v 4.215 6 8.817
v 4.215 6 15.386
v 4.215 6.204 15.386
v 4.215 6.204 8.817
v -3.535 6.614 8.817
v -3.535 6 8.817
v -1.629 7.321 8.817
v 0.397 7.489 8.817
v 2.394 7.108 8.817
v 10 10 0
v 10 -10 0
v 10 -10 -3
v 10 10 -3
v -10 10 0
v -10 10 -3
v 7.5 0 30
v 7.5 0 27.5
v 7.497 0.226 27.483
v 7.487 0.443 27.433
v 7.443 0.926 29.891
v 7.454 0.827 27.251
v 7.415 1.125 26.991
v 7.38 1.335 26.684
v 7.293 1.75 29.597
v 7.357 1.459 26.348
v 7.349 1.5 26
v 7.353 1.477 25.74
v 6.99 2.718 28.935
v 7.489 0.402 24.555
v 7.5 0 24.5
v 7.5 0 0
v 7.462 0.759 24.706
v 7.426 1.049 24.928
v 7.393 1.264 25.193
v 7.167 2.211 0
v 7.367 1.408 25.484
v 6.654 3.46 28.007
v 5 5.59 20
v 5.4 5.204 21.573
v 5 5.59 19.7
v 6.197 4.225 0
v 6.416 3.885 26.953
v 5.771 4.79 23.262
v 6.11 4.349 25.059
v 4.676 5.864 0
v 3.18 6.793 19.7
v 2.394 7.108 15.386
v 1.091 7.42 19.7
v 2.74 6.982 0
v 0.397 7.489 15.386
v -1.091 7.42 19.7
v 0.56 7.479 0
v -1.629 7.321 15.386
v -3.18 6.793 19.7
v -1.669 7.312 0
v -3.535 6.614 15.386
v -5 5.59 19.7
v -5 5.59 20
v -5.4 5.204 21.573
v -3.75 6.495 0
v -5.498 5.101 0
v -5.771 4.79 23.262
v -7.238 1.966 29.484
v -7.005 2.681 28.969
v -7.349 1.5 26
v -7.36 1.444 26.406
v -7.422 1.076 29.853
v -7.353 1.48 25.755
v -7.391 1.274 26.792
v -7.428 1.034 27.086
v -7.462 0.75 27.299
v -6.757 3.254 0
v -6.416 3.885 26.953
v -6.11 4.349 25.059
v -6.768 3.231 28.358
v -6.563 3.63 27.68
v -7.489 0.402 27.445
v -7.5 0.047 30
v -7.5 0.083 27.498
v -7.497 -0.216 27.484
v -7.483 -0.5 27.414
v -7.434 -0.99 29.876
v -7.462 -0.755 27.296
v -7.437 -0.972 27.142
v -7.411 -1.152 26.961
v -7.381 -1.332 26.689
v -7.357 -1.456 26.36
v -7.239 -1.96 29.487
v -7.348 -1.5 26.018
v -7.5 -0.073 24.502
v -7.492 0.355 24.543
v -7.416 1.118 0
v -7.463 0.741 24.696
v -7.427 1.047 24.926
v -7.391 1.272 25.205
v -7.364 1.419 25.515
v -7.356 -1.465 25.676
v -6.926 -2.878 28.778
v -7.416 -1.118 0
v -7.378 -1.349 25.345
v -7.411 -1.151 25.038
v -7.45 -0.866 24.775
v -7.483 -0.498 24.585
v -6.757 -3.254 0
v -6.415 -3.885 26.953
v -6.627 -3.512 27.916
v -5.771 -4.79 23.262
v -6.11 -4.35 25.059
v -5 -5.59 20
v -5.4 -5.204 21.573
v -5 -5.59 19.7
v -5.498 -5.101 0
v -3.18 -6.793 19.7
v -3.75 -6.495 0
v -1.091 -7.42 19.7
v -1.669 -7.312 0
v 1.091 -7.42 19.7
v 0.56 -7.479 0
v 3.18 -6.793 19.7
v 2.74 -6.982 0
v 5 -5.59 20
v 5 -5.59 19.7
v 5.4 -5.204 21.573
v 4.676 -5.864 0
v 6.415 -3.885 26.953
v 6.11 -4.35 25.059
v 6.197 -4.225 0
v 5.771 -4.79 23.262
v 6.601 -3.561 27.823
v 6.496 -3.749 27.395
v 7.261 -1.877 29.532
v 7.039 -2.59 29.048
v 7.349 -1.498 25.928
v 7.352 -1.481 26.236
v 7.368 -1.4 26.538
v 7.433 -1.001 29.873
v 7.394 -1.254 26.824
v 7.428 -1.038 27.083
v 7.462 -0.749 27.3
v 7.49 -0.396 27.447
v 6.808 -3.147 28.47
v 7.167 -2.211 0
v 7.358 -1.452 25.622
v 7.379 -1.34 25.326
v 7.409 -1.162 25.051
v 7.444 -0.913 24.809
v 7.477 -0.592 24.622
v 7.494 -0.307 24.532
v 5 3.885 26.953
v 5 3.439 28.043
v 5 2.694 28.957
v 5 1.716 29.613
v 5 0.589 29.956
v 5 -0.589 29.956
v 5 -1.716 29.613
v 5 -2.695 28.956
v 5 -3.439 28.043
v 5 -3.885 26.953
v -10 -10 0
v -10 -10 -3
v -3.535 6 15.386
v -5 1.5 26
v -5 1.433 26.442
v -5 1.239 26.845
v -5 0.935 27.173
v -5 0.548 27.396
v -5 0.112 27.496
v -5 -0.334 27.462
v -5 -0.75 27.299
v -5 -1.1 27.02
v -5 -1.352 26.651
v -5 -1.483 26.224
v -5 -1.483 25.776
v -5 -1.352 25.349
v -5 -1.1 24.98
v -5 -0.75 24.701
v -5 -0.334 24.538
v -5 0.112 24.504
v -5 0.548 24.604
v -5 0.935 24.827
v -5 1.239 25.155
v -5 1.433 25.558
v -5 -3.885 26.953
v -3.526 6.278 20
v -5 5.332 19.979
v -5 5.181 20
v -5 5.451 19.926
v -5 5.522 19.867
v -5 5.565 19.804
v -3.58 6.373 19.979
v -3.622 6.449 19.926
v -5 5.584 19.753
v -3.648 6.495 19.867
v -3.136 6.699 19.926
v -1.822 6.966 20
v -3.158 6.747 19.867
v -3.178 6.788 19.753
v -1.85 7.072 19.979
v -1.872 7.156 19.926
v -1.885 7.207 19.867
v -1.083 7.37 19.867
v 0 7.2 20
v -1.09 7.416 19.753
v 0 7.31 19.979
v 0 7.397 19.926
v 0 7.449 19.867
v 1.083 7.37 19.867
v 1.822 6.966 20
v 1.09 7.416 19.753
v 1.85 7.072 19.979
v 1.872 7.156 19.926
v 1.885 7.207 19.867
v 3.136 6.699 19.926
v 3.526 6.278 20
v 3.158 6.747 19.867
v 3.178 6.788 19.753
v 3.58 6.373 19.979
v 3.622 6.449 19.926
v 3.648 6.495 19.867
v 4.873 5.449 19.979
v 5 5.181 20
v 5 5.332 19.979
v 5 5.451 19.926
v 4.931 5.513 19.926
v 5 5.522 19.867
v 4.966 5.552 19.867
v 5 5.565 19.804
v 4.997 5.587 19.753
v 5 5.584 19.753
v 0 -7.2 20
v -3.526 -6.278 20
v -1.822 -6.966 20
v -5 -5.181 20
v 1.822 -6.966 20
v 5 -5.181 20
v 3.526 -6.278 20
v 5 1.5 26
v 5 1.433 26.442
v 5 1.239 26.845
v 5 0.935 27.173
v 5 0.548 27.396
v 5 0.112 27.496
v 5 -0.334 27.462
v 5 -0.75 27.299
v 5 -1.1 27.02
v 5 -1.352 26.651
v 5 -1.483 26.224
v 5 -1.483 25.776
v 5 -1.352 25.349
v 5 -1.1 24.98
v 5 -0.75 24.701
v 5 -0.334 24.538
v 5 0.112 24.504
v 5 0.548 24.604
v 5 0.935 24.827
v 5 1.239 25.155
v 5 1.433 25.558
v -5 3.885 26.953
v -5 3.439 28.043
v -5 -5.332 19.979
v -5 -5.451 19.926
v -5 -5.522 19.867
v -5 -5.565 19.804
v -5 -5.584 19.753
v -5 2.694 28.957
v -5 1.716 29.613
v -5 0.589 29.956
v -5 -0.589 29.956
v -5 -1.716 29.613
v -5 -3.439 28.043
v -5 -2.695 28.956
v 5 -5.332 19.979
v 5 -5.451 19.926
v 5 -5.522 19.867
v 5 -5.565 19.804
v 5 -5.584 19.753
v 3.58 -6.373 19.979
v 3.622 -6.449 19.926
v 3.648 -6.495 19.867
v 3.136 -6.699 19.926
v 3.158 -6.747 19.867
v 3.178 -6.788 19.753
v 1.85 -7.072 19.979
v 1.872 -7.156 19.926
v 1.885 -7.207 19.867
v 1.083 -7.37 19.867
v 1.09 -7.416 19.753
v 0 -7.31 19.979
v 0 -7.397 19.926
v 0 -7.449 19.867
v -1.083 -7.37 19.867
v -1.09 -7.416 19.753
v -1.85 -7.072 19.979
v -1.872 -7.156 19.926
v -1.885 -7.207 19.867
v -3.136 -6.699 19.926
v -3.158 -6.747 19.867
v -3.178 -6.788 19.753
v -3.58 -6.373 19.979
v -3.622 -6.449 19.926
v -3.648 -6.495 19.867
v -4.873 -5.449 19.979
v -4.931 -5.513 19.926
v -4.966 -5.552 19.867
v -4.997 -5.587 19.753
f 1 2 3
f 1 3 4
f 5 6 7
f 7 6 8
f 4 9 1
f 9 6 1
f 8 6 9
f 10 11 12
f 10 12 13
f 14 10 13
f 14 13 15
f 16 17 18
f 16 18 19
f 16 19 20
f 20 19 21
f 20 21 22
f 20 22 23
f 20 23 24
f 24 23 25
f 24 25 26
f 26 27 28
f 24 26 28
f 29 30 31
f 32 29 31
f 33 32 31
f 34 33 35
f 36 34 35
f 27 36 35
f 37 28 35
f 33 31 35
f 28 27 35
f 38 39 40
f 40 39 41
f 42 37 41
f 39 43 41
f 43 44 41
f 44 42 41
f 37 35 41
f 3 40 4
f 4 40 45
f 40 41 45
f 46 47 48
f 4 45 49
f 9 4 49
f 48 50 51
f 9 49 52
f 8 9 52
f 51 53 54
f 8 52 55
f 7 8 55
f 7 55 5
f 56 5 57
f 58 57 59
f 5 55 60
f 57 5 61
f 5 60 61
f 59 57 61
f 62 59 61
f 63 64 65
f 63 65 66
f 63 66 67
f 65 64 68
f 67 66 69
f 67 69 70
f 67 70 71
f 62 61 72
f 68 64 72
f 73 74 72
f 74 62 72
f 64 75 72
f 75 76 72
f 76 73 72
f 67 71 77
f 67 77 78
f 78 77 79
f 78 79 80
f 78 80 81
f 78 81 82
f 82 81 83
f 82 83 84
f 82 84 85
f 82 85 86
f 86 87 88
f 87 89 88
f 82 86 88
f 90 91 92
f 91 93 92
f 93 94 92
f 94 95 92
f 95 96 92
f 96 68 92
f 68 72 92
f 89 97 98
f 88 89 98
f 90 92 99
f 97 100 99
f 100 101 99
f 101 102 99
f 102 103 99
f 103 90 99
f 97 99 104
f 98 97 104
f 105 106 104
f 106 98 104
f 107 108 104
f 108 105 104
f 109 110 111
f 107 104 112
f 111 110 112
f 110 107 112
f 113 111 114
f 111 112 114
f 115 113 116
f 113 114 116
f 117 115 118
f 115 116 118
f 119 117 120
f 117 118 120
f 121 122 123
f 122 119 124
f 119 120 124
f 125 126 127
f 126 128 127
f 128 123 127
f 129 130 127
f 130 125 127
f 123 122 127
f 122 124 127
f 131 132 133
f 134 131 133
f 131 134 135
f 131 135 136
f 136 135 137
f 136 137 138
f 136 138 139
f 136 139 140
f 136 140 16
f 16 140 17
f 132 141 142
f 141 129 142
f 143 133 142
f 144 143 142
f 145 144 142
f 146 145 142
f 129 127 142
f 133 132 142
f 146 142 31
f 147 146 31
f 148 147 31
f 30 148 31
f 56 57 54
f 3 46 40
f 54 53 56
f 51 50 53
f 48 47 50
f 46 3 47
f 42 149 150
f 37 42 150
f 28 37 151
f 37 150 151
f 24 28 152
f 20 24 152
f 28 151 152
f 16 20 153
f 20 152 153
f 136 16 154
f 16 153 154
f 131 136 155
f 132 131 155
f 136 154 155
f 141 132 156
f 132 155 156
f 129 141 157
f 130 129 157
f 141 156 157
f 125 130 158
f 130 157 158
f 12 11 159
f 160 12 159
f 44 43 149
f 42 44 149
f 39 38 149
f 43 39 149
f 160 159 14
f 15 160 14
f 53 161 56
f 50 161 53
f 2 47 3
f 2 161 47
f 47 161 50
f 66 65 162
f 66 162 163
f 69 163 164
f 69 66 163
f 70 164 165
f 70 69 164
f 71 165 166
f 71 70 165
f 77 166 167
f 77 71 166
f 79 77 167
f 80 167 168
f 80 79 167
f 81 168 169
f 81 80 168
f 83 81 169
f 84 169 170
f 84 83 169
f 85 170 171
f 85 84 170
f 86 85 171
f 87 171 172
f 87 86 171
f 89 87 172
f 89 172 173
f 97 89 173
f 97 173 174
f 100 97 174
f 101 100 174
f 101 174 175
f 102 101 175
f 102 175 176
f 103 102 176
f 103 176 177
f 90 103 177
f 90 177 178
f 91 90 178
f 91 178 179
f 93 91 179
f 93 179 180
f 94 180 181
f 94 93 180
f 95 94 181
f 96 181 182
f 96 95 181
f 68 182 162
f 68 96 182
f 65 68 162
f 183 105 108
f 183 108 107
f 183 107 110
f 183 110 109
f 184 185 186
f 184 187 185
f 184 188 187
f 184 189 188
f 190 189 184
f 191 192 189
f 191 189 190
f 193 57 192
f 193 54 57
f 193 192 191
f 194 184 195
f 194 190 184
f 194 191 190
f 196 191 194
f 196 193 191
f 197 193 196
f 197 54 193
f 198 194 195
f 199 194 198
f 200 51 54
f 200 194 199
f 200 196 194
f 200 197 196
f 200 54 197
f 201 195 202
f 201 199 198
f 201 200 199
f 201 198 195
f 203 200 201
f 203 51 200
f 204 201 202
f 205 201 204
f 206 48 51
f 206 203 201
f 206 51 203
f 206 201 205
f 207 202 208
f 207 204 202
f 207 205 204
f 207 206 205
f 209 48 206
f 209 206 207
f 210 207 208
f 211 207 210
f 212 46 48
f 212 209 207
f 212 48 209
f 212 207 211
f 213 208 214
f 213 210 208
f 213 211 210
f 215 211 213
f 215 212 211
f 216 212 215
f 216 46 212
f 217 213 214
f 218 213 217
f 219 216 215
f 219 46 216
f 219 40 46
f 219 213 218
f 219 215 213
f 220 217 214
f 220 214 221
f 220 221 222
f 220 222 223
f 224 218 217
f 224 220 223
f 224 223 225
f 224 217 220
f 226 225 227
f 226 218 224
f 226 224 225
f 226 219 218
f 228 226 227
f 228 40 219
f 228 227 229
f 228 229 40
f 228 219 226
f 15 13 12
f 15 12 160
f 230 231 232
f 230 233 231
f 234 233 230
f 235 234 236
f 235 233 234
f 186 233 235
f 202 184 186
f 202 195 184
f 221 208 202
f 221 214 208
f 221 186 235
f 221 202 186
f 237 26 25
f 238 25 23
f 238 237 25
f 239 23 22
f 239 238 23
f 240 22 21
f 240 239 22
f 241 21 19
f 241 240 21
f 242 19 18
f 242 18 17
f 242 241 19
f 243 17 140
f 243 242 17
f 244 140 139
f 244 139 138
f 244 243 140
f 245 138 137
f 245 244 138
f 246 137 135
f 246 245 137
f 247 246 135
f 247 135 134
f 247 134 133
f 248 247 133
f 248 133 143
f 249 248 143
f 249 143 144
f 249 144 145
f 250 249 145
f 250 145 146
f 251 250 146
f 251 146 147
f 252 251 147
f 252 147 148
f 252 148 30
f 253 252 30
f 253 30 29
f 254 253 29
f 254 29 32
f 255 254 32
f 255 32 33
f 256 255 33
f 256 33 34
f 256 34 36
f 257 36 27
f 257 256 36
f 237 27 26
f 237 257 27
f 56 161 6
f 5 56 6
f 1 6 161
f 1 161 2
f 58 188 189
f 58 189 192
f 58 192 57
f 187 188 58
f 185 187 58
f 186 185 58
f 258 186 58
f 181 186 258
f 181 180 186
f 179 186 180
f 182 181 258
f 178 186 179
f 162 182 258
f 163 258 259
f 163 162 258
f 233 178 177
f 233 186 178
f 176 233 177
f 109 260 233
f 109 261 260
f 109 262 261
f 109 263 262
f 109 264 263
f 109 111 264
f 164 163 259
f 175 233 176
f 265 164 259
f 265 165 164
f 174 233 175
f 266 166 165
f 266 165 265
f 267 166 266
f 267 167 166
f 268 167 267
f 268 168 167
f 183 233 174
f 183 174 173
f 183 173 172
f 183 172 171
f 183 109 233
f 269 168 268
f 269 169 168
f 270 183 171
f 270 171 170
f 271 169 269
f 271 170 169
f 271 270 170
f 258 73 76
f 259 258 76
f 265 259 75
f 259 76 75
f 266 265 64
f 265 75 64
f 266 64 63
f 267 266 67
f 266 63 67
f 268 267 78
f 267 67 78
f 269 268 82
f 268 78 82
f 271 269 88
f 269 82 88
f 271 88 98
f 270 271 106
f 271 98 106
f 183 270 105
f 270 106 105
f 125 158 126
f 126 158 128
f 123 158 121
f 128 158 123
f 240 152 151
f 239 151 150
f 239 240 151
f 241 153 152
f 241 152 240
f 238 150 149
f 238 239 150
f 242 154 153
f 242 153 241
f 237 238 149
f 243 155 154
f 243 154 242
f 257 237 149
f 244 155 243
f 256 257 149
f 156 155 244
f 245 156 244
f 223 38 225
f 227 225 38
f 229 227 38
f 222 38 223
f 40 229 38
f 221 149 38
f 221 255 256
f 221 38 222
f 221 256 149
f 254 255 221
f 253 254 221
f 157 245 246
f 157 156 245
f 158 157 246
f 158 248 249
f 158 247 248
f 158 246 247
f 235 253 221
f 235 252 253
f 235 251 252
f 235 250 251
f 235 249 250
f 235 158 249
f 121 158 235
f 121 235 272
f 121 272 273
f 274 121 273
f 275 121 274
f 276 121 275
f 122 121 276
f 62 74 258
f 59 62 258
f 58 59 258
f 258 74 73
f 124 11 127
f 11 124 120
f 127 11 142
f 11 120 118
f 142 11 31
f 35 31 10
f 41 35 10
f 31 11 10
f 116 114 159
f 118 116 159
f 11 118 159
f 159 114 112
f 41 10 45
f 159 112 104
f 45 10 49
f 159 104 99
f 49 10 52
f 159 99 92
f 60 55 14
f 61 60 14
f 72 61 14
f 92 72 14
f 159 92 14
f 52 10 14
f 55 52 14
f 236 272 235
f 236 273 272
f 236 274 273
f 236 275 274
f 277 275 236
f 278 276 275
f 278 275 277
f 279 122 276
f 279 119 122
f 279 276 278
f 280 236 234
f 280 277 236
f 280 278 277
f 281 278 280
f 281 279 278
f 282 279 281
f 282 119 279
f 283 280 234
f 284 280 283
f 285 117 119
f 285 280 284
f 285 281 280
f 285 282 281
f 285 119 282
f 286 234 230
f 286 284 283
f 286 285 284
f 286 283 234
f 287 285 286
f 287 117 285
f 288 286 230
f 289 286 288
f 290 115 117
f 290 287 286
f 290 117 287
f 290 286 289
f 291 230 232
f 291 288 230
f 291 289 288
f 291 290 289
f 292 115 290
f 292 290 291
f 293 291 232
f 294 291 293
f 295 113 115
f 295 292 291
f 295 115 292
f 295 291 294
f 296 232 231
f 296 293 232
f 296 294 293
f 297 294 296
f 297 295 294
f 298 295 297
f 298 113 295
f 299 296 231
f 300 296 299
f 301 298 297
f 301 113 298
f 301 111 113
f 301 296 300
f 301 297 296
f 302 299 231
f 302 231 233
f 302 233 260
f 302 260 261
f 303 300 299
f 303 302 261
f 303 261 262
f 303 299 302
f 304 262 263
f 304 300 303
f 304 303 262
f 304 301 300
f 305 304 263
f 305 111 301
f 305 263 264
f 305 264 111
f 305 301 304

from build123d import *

# Parameters (mm, degrees)
CROQUIS1_R                 = 7.5
SALIENTE_EXTRUIR1_DEPTH    = 30
CORTAR_EXTRUIR1_DEPTH      = 32.819805153
CORTAR_EXTRUIR1_DEPTH_BACK = 10
CROQUIS2_W                 = 10
CROQUIS2_H                 = 15.47925891
CORTAR_EXTRUIR3_DEPTH      = 32.819805153
CORTAR_EXTRUIR3_DEPTH_BACK = 32.819805153
CORTAR_EXTRUIR4_DEPTH      = 32.819805295
CORTAR_EXTRUIR4_DEPTH_BACK = 32.819805295
CROQUIS4_R                 = 1.5
REDONDEO1_R                = 0.3
CROQUIS5_W                 = 20
CROQUIS5_H                 = 20
SALIENTE_EXTRUIR2_DEPTH    = 3
CORTAR_EXTRUIR5_START      = 6
CROQUIS6_W                 = 7.750181945
CROQUIS6_H                 = 6.56920184
CORTAR_EXTRUIR5_DEPTH      = 10


with BuildPart() as part:
    # Croquis1 → Saliente-Extruir1 (new body)
    with BuildSketch(Plane.XY):
        Circle(CROQUIS1_R)
    extrude(amount=SALIENTE_EXTRUIR1_DEPTH)

    # Croquis2 → Cortar-Extruir1 (cut, two sides: drawn at the far end of the back side and taken through both)
    with BuildSketch(Plane.XY.offset(30).offset(-CORTAR_EXTRUIR1_DEPTH_BACK)):
        Rectangle(CROQUIS2_W, CROQUIS2_H)
    extrude(amount=CORTAR_EXTRUIR1_DEPTH + CORTAR_EXTRUIR1_DEPTH_BACK, mode=Mode.SUBTRACT)

    # Croquis3 → Cortar-Extruir3 (cut, two sides: drawn at the far end of the back side and taken through both)
    with BuildSketch(Plane(origin=(0, 0, 0), x_dir=(0, 0, -1), z_dir=(1, 0, 0)).offset(-CORTAR_EXTRUIR3_DEPTH_BACK)):
        with BuildLine():
            Line((-20, 67.5), (-20, 7.5))
            Line((-20, 7.5), (-20, 5.590169944))
            Line((-20, 5.590169944), (-26.952923855, 3.884664175))
            ThreePointArc((-26.952923855, 3.884664175), (-29.999999999, -0.000262165), (-26.952744721, -3.885047998))
            Line((-26.952744721, -3.885047998), (-20, -5.590169944))
            Line((-20, -5.590169944), (-20, -7.5))
            Line((-20, -7.5), (-20, -67.5))
            Line((-20, -67.5), (-140, -67.5))
            Line((-140, -67.5), (-140, 67.5))
            Line((-140, 67.5), (-20, 67.5))
        make_face()
    extrude(amount=CORTAR_EXTRUIR3_DEPTH + CORTAR_EXTRUIR3_DEPTH_BACK, mode=Mode.SUBTRACT)

    # Croquis4 → Cortar-Extruir4 (cut, two sides: drawn at the far end of the back side and taken through both)
    with BuildSketch(Plane(origin=(0, 0, 0), x_dir=(0, 0, -1), z_dir=(1, 0, 0)).offset(-CORTAR_EXTRUIR4_DEPTH_BACK)):
        with Locations(Location((-26, -0.000169944, 0), (0, 0, 90))):
            Circle(CROQUIS4_R)
    extrude(amount=CORTAR_EXTRUIR4_DEPTH + CORTAR_EXTRUIR4_DEPTH_BACK, mode=Mode.SUBTRACT)

    # Redondeo1
    # the kernel refuses this fillet: 0.3 mm, written as the material it takes off along each edge
    with BuildSketch(Plane(origin=(0, 0, 20), x_dir=(0.7377709544179419, -0.6750511231138268, 0), z_dir=(0.6750511231138268, 0.7377709544179419, 0))) as redondeo1_piece_1_section:
        with BuildLine():
            CenterArc((7.5 - REDONDEO1_R, REDONDEO1_R), REDONDEO1_R, 270, 90)
            Line((7.5 - REDONDEO1_R, 0), (7.5, 0))
            Line((7.5, 0), (7.5, REDONDEO1_R))
        make_face()
    redondeo1_piece_1 = revolve(axis=Axis((0, 0, 20), (0, 0, -1)), revolution_arc=95.083759333, mode=Mode.PRIVATE)
    redondeo1_piece_1 = split(redondeo1_piece_1, bisect_by=Plane(origin=(5, -5.527382777, 19.949282133), z_dir=(-1, 0, 0)), keep=Keep.TOP, mode=Mode.PRIVATE)
    redondeo1_piece_1 = split(redondeo1_piece_1, bisect_by=Plane(origin=(-5, -5.527382777, 19.949282133), z_dir=(1, 0, 0)), keep=Keep.TOP, mode=Mode.PRIVATE)
    add(redondeo1_piece_1, mode=Mode.SUBTRACT)
    with BuildSketch(Plane(origin=(0, 0, 20), x_dir=(-0.737770954417942, 0.6750511231138266, 0), z_dir=(-0.6750511231138266, -0.737770954417942, 0))) as redondeo1_piece_2_section:
        with BuildLine():
            CenterArc((7.5 - REDONDEO1_R, REDONDEO1_R), REDONDEO1_R, 270, 90)
            Line((7.5 - REDONDEO1_R, 0), (7.5, 0))
            Line((7.5, 0), (7.5, REDONDEO1_R))
        make_face()
    redondeo1_piece_2 = revolve(axis=Axis((0, 0, 20), (0, 0, -1)), revolution_arc=95.083759333, mode=Mode.PRIVATE)
    redondeo1_piece_2 = split(redondeo1_piece_2, bisect_by=Plane(origin=(5, 5.527385531, 19.949280237), z_dir=(-1, 0, 0)), keep=Keep.TOP, mode=Mode.PRIVATE)
    redondeo1_piece_2 = split(redondeo1_piece_2, bisect_by=Plane(origin=(-5, 5.527385531, 19.949280237), z_dir=(1, 0, 0)), keep=Keep.TOP, mode=Mode.PRIVATE)
    add(redondeo1_piece_2, mode=Mode.SUBTRACT)

    # Croquis5 → Saliente-Extruir2 (add)
    with BuildSketch(Plane(origin=(0, 0, 0), x_dir=(-1, 0, 0), z_dir=(0, 0, -1))):
        Rectangle(CROQUIS5_W, CROQUIS5_H)
    extrude(amount=SALIENTE_EXTRUIR2_DEPTH)

    # Croquis6 → Cortar-Extruir5 (cut)
    with BuildSketch(Plane(origin=(0, 0, 0), x_dir=(1, 0, 0), z_dir=(0, 1, 0)).offset(CORTAR_EXTRUIR5_START)):
        with Locations((0.339668607, -12.101574185)):
            Rectangle(CROQUIS6_W, CROQUIS6_H)
    extrude(amount=CORTAR_EXTRUIR5_DEPTH, mode=Mode.SUBTRACT)


solid = part.part
